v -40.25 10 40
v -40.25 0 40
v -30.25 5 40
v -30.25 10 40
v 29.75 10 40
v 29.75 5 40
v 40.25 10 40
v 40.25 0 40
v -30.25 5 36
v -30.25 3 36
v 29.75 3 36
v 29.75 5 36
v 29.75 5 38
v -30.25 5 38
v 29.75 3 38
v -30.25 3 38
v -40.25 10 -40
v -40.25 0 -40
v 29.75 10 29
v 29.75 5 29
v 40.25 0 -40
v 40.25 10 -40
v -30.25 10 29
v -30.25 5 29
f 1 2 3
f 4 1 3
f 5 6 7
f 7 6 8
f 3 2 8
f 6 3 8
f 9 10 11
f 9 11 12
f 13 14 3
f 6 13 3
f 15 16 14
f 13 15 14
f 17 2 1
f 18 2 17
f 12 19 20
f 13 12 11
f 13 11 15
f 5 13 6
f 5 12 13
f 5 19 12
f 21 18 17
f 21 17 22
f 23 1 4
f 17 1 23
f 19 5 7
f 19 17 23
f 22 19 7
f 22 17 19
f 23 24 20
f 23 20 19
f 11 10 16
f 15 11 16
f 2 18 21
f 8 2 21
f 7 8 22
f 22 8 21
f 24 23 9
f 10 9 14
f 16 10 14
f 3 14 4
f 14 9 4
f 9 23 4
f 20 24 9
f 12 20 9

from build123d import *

# Parameters (mm, degrees)
SKETCH1_W           = 80.5
SKETCH1_H           = 80
BOSS_EXTRUDE1_DEPTH = 10
CUT_EXTRUDE1_START  = -10
SKETCH2_W           = 11
SKETCH2_H           = 5
CUT_EXTRUDE1_DEPTH  = 60
CUT_EXTRUDE2_START  = -10
SKETCH3_W           = 2
SKETCH3_H           = 2
CUT_EXTRUDE2_DEPTH  = 60


with BuildPart() as part:
    # Sketch1 → Boss-Extrude1 (new body)
    with BuildSketch(Plane(origin=(0, 0, 0), x_dir=(1, 0, 0), z_dir=(0, 1, 0))):
        Rectangle(SKETCH1_W, SKETCH1_H)
    extrude(amount=BOSS_EXTRUDE1_DEPTH)

    # Sketch2 → Cut-Extrude1 (cut)
    with BuildSketch(Plane.ZY.offset(40.25).offset(CUT_EXTRUDE1_START)):
        with Locations((34.5, 7.5)):
            Rectangle(SKETCH2_W, SKETCH2_H)
    extrude(amount=-CUT_EXTRUDE1_DEPTH, mode=Mode.SUBTRACT)

    # Sketch3 → Cut-Extrude2 (cut)
    with BuildSketch(Plane.ZY.offset(40.25).offset(CUT_EXTRUDE2_START)):
        with Locations((37, 4)):
            Rectangle(SKETCH3_W, SKETCH3_H)
    extrude(amount=-CUT_EXTRUDE2_DEPTH, mode=Mode.SUBTRACT)


solid = part.part
